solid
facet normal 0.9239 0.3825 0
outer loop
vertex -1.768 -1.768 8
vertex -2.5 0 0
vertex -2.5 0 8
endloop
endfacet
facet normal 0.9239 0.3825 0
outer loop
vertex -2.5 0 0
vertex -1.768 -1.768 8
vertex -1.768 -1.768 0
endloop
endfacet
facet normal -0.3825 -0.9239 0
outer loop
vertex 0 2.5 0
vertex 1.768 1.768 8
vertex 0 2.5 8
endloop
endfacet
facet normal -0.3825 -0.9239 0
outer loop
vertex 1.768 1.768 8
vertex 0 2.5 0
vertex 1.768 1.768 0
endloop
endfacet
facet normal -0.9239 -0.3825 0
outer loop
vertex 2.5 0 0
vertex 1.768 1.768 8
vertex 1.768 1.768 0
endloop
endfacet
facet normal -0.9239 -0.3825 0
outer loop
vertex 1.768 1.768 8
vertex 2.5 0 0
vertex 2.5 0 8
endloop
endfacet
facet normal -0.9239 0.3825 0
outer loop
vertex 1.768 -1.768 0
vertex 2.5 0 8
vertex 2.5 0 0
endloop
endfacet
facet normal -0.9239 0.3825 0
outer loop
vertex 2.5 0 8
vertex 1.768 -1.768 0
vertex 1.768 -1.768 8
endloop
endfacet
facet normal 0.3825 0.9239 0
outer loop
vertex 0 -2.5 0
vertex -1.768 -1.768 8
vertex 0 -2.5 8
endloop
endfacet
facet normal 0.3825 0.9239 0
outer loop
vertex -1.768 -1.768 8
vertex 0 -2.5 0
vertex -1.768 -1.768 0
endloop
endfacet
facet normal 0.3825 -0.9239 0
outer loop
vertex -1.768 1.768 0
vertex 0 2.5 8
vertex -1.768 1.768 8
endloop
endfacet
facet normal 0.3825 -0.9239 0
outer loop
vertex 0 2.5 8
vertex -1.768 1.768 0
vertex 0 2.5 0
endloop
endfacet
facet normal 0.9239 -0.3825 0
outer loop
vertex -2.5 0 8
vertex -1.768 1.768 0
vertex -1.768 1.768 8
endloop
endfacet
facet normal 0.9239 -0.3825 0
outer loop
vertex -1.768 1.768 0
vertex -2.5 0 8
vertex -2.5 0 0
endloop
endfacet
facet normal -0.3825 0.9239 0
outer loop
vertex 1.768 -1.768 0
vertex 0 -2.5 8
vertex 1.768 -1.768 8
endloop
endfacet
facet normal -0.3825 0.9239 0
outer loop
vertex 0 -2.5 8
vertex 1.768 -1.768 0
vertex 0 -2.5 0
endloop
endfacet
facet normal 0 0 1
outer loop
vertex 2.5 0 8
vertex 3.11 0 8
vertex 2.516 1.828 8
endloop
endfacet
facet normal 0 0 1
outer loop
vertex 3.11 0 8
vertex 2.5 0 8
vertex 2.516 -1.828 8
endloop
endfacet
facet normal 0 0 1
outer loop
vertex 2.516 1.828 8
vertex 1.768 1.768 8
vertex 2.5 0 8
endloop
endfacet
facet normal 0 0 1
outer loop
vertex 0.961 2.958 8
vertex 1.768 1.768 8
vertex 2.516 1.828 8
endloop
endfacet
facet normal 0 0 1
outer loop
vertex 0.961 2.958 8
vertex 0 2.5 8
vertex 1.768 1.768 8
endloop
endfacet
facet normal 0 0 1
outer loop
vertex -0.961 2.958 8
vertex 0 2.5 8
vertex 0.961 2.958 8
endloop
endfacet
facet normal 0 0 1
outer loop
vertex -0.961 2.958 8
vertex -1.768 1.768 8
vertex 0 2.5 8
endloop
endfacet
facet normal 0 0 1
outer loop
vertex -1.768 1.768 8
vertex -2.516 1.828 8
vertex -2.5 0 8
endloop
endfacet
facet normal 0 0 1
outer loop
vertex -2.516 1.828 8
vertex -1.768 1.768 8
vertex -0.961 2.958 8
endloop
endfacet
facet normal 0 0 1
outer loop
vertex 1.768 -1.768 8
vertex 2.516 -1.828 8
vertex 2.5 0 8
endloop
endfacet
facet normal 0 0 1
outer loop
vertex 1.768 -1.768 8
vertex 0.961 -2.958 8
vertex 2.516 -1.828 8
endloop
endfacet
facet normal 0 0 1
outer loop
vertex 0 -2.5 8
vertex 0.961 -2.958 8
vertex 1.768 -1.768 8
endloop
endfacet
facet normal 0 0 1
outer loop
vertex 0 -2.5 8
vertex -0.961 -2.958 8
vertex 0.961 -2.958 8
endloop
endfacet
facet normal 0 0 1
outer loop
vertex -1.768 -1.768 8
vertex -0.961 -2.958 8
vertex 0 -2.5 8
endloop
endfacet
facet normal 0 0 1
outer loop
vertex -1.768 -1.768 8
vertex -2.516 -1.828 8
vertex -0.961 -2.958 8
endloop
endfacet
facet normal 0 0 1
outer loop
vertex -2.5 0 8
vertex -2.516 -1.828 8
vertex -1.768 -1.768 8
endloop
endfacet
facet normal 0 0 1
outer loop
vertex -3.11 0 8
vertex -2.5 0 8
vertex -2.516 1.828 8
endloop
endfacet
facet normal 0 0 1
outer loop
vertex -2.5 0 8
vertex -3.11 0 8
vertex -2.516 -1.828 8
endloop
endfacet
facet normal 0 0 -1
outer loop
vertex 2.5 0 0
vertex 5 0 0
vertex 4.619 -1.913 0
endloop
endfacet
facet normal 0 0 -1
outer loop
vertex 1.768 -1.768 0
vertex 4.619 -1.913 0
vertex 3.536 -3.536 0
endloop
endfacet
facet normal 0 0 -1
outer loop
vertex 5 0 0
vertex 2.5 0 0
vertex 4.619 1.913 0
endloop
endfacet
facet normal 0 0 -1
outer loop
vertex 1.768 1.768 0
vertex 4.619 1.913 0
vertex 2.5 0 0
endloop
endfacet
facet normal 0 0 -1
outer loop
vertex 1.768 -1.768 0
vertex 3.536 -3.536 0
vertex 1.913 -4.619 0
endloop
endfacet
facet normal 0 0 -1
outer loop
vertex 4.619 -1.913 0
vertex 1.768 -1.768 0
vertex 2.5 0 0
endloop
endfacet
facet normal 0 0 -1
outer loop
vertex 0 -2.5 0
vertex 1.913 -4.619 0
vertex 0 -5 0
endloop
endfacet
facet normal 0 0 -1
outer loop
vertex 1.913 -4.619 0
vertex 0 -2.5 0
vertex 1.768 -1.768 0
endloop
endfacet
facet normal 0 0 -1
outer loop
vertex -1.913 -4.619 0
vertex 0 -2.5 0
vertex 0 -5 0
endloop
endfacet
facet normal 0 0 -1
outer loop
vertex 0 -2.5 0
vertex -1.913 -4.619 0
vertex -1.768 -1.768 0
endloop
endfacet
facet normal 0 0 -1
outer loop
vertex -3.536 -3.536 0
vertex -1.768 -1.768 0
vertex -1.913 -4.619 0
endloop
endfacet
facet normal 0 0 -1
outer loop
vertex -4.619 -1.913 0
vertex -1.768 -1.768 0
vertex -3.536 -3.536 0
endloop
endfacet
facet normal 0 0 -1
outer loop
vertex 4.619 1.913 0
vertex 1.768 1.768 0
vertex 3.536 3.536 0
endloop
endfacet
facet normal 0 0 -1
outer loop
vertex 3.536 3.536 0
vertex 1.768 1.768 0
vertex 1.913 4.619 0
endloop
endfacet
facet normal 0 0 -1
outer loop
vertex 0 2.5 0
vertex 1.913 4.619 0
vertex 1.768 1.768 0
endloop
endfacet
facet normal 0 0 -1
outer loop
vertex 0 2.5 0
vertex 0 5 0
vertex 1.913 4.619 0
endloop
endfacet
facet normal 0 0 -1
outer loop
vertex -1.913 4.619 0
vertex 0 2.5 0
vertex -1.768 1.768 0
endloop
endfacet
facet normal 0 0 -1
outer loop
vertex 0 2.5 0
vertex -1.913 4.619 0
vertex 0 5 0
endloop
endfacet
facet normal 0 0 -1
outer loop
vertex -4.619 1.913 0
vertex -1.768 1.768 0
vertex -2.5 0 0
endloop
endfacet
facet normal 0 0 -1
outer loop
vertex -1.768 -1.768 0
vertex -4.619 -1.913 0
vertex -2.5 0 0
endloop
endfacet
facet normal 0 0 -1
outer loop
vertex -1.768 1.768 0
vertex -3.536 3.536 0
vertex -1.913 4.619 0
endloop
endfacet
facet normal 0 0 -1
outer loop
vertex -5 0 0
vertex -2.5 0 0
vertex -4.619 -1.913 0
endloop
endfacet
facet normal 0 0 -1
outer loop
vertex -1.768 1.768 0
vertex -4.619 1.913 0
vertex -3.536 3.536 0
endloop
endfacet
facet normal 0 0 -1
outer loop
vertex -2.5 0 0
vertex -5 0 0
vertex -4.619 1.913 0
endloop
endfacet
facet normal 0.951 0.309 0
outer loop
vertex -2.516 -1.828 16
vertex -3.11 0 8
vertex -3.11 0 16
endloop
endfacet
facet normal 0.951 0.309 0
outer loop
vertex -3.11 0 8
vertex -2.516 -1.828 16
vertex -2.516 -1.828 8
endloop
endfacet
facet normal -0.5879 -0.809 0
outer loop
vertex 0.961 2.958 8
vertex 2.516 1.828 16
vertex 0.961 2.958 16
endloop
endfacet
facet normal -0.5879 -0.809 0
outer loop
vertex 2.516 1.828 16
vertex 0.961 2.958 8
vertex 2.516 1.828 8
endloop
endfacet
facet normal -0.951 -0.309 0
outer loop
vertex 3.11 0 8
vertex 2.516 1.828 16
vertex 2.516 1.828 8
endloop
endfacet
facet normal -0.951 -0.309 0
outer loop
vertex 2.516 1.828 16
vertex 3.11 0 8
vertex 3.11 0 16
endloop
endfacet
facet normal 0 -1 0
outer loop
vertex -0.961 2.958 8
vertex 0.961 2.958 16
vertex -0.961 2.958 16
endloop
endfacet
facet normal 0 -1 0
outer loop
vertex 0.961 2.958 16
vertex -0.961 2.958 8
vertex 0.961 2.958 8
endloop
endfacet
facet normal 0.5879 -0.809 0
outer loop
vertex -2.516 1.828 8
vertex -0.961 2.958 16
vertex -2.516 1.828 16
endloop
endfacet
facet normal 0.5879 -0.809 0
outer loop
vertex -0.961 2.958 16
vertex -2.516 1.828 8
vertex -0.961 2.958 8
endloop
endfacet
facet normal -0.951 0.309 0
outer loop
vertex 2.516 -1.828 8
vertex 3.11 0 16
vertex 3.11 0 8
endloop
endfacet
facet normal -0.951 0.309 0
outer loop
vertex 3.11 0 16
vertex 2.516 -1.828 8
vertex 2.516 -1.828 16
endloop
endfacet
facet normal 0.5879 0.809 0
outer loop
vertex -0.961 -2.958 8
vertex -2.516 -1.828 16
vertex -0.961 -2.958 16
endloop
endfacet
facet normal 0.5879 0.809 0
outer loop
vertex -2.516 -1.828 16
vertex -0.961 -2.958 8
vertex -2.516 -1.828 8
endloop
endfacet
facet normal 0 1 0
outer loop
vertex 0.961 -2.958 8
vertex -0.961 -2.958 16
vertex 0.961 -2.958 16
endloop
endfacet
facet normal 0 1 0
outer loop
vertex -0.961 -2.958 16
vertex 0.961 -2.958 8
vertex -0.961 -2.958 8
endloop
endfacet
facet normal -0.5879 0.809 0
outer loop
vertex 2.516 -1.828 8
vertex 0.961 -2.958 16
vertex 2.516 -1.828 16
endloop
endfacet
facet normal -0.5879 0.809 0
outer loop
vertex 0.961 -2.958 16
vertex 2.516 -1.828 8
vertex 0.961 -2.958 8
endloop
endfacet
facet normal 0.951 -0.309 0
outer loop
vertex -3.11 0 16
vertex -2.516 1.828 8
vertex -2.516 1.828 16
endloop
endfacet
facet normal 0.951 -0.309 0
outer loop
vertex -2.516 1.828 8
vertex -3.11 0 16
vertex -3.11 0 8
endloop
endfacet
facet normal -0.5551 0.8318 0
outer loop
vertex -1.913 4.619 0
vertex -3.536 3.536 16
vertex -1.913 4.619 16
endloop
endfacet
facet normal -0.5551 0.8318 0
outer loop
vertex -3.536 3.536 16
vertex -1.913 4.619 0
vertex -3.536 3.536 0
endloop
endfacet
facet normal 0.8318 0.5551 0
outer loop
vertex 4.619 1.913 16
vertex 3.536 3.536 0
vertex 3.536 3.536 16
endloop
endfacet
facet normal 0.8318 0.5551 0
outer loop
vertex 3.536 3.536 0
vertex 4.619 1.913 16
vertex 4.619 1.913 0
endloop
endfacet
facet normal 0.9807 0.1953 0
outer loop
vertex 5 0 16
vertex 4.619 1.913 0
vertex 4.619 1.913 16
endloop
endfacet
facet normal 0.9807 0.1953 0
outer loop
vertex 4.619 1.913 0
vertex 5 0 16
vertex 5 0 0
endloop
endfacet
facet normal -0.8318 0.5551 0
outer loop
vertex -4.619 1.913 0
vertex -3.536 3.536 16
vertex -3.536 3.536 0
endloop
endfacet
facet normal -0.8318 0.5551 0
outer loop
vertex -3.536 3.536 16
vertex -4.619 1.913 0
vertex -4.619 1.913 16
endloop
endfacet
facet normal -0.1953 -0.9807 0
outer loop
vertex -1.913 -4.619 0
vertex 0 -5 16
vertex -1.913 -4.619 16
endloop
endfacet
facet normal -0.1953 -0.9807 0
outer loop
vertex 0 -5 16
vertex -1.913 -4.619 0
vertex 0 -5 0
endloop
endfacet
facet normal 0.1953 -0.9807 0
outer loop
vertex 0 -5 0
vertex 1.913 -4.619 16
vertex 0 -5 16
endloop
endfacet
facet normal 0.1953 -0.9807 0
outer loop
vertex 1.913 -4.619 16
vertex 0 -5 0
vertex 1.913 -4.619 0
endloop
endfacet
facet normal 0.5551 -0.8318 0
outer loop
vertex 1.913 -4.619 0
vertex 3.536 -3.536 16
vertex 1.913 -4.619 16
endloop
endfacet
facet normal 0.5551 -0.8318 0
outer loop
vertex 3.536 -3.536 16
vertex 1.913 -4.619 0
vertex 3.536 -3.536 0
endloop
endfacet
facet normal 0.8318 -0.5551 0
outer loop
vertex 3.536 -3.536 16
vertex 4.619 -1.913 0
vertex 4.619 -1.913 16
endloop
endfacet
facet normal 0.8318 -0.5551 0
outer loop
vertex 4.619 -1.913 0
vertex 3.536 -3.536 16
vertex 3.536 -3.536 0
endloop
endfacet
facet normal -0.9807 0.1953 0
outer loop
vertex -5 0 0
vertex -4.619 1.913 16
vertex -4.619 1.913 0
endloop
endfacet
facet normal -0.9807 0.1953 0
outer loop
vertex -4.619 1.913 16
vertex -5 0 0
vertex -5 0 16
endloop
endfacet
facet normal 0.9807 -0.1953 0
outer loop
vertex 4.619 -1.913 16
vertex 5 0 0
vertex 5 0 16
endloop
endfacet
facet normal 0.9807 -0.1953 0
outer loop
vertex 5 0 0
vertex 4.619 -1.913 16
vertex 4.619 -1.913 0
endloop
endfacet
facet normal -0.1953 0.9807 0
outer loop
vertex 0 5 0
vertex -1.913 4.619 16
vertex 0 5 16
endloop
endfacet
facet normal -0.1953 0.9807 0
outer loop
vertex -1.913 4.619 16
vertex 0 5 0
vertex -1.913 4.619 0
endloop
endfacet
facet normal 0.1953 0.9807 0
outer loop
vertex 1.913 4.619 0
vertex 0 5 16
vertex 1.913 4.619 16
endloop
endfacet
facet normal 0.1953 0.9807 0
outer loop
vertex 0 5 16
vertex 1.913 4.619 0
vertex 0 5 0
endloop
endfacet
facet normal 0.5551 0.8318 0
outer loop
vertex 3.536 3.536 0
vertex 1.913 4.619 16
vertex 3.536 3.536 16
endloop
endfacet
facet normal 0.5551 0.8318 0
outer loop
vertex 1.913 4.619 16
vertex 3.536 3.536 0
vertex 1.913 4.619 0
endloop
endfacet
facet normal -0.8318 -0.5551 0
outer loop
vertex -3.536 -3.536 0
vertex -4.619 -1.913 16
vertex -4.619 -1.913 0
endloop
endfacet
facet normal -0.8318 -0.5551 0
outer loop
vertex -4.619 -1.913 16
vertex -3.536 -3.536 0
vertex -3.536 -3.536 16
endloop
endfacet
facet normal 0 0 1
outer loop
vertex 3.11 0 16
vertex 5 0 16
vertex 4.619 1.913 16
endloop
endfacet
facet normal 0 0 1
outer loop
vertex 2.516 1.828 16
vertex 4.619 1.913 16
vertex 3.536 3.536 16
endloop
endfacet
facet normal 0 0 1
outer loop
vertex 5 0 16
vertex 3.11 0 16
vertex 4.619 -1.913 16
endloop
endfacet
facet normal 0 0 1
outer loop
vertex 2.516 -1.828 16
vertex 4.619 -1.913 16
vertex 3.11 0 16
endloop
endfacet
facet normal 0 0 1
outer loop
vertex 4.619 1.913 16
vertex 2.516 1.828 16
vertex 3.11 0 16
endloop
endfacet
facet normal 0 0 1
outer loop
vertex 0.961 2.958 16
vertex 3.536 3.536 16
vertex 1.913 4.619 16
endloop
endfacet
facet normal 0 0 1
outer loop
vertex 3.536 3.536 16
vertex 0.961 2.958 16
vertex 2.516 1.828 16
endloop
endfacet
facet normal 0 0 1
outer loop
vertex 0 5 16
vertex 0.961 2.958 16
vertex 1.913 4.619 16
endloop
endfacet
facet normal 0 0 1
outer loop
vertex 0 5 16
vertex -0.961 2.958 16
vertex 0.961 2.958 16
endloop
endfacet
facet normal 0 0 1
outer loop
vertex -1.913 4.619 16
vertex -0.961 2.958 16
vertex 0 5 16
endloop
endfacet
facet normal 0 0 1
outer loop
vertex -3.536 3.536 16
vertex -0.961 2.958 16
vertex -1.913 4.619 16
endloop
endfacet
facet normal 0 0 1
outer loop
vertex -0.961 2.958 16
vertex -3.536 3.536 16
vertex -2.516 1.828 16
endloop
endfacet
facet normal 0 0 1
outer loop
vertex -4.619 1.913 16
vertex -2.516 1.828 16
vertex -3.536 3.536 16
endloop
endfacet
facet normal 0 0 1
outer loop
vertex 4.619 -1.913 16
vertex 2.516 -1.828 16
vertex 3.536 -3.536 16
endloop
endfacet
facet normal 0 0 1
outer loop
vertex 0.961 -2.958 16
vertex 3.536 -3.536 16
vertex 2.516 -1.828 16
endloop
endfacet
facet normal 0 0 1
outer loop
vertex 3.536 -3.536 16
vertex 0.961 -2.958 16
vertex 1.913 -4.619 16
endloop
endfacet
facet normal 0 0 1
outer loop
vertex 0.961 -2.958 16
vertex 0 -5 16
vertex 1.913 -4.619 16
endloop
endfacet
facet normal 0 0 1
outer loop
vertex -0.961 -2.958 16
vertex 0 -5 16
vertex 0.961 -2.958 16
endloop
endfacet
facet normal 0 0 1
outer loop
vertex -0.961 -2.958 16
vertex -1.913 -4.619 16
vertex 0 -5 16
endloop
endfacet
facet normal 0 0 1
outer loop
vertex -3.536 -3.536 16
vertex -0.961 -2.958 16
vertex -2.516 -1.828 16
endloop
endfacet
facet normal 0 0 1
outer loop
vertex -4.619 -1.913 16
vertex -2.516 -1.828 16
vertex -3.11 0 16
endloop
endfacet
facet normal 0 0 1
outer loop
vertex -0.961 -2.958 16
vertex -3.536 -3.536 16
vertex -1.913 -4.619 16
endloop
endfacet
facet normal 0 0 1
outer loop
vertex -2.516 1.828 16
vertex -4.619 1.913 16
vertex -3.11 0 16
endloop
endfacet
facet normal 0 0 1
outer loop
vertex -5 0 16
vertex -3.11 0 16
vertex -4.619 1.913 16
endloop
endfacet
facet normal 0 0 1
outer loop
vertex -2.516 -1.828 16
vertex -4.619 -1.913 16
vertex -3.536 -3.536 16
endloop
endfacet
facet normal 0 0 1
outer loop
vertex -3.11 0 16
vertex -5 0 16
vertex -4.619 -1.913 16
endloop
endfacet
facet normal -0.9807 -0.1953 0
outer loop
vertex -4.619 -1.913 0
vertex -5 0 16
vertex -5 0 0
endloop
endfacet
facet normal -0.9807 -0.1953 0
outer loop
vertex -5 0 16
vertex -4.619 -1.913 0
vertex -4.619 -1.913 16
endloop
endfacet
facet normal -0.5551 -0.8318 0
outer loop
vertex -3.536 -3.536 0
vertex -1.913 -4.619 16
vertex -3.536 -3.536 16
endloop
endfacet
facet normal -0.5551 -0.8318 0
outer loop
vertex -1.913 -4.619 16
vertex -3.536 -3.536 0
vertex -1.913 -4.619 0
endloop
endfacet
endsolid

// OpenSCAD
difference(){
cylinder(16, 5,5);

union(){cylinder(8, 2.5,2.5);

translate([0, 0,8]) cylinder(9, 6.22/2,6.22/2);}
}
